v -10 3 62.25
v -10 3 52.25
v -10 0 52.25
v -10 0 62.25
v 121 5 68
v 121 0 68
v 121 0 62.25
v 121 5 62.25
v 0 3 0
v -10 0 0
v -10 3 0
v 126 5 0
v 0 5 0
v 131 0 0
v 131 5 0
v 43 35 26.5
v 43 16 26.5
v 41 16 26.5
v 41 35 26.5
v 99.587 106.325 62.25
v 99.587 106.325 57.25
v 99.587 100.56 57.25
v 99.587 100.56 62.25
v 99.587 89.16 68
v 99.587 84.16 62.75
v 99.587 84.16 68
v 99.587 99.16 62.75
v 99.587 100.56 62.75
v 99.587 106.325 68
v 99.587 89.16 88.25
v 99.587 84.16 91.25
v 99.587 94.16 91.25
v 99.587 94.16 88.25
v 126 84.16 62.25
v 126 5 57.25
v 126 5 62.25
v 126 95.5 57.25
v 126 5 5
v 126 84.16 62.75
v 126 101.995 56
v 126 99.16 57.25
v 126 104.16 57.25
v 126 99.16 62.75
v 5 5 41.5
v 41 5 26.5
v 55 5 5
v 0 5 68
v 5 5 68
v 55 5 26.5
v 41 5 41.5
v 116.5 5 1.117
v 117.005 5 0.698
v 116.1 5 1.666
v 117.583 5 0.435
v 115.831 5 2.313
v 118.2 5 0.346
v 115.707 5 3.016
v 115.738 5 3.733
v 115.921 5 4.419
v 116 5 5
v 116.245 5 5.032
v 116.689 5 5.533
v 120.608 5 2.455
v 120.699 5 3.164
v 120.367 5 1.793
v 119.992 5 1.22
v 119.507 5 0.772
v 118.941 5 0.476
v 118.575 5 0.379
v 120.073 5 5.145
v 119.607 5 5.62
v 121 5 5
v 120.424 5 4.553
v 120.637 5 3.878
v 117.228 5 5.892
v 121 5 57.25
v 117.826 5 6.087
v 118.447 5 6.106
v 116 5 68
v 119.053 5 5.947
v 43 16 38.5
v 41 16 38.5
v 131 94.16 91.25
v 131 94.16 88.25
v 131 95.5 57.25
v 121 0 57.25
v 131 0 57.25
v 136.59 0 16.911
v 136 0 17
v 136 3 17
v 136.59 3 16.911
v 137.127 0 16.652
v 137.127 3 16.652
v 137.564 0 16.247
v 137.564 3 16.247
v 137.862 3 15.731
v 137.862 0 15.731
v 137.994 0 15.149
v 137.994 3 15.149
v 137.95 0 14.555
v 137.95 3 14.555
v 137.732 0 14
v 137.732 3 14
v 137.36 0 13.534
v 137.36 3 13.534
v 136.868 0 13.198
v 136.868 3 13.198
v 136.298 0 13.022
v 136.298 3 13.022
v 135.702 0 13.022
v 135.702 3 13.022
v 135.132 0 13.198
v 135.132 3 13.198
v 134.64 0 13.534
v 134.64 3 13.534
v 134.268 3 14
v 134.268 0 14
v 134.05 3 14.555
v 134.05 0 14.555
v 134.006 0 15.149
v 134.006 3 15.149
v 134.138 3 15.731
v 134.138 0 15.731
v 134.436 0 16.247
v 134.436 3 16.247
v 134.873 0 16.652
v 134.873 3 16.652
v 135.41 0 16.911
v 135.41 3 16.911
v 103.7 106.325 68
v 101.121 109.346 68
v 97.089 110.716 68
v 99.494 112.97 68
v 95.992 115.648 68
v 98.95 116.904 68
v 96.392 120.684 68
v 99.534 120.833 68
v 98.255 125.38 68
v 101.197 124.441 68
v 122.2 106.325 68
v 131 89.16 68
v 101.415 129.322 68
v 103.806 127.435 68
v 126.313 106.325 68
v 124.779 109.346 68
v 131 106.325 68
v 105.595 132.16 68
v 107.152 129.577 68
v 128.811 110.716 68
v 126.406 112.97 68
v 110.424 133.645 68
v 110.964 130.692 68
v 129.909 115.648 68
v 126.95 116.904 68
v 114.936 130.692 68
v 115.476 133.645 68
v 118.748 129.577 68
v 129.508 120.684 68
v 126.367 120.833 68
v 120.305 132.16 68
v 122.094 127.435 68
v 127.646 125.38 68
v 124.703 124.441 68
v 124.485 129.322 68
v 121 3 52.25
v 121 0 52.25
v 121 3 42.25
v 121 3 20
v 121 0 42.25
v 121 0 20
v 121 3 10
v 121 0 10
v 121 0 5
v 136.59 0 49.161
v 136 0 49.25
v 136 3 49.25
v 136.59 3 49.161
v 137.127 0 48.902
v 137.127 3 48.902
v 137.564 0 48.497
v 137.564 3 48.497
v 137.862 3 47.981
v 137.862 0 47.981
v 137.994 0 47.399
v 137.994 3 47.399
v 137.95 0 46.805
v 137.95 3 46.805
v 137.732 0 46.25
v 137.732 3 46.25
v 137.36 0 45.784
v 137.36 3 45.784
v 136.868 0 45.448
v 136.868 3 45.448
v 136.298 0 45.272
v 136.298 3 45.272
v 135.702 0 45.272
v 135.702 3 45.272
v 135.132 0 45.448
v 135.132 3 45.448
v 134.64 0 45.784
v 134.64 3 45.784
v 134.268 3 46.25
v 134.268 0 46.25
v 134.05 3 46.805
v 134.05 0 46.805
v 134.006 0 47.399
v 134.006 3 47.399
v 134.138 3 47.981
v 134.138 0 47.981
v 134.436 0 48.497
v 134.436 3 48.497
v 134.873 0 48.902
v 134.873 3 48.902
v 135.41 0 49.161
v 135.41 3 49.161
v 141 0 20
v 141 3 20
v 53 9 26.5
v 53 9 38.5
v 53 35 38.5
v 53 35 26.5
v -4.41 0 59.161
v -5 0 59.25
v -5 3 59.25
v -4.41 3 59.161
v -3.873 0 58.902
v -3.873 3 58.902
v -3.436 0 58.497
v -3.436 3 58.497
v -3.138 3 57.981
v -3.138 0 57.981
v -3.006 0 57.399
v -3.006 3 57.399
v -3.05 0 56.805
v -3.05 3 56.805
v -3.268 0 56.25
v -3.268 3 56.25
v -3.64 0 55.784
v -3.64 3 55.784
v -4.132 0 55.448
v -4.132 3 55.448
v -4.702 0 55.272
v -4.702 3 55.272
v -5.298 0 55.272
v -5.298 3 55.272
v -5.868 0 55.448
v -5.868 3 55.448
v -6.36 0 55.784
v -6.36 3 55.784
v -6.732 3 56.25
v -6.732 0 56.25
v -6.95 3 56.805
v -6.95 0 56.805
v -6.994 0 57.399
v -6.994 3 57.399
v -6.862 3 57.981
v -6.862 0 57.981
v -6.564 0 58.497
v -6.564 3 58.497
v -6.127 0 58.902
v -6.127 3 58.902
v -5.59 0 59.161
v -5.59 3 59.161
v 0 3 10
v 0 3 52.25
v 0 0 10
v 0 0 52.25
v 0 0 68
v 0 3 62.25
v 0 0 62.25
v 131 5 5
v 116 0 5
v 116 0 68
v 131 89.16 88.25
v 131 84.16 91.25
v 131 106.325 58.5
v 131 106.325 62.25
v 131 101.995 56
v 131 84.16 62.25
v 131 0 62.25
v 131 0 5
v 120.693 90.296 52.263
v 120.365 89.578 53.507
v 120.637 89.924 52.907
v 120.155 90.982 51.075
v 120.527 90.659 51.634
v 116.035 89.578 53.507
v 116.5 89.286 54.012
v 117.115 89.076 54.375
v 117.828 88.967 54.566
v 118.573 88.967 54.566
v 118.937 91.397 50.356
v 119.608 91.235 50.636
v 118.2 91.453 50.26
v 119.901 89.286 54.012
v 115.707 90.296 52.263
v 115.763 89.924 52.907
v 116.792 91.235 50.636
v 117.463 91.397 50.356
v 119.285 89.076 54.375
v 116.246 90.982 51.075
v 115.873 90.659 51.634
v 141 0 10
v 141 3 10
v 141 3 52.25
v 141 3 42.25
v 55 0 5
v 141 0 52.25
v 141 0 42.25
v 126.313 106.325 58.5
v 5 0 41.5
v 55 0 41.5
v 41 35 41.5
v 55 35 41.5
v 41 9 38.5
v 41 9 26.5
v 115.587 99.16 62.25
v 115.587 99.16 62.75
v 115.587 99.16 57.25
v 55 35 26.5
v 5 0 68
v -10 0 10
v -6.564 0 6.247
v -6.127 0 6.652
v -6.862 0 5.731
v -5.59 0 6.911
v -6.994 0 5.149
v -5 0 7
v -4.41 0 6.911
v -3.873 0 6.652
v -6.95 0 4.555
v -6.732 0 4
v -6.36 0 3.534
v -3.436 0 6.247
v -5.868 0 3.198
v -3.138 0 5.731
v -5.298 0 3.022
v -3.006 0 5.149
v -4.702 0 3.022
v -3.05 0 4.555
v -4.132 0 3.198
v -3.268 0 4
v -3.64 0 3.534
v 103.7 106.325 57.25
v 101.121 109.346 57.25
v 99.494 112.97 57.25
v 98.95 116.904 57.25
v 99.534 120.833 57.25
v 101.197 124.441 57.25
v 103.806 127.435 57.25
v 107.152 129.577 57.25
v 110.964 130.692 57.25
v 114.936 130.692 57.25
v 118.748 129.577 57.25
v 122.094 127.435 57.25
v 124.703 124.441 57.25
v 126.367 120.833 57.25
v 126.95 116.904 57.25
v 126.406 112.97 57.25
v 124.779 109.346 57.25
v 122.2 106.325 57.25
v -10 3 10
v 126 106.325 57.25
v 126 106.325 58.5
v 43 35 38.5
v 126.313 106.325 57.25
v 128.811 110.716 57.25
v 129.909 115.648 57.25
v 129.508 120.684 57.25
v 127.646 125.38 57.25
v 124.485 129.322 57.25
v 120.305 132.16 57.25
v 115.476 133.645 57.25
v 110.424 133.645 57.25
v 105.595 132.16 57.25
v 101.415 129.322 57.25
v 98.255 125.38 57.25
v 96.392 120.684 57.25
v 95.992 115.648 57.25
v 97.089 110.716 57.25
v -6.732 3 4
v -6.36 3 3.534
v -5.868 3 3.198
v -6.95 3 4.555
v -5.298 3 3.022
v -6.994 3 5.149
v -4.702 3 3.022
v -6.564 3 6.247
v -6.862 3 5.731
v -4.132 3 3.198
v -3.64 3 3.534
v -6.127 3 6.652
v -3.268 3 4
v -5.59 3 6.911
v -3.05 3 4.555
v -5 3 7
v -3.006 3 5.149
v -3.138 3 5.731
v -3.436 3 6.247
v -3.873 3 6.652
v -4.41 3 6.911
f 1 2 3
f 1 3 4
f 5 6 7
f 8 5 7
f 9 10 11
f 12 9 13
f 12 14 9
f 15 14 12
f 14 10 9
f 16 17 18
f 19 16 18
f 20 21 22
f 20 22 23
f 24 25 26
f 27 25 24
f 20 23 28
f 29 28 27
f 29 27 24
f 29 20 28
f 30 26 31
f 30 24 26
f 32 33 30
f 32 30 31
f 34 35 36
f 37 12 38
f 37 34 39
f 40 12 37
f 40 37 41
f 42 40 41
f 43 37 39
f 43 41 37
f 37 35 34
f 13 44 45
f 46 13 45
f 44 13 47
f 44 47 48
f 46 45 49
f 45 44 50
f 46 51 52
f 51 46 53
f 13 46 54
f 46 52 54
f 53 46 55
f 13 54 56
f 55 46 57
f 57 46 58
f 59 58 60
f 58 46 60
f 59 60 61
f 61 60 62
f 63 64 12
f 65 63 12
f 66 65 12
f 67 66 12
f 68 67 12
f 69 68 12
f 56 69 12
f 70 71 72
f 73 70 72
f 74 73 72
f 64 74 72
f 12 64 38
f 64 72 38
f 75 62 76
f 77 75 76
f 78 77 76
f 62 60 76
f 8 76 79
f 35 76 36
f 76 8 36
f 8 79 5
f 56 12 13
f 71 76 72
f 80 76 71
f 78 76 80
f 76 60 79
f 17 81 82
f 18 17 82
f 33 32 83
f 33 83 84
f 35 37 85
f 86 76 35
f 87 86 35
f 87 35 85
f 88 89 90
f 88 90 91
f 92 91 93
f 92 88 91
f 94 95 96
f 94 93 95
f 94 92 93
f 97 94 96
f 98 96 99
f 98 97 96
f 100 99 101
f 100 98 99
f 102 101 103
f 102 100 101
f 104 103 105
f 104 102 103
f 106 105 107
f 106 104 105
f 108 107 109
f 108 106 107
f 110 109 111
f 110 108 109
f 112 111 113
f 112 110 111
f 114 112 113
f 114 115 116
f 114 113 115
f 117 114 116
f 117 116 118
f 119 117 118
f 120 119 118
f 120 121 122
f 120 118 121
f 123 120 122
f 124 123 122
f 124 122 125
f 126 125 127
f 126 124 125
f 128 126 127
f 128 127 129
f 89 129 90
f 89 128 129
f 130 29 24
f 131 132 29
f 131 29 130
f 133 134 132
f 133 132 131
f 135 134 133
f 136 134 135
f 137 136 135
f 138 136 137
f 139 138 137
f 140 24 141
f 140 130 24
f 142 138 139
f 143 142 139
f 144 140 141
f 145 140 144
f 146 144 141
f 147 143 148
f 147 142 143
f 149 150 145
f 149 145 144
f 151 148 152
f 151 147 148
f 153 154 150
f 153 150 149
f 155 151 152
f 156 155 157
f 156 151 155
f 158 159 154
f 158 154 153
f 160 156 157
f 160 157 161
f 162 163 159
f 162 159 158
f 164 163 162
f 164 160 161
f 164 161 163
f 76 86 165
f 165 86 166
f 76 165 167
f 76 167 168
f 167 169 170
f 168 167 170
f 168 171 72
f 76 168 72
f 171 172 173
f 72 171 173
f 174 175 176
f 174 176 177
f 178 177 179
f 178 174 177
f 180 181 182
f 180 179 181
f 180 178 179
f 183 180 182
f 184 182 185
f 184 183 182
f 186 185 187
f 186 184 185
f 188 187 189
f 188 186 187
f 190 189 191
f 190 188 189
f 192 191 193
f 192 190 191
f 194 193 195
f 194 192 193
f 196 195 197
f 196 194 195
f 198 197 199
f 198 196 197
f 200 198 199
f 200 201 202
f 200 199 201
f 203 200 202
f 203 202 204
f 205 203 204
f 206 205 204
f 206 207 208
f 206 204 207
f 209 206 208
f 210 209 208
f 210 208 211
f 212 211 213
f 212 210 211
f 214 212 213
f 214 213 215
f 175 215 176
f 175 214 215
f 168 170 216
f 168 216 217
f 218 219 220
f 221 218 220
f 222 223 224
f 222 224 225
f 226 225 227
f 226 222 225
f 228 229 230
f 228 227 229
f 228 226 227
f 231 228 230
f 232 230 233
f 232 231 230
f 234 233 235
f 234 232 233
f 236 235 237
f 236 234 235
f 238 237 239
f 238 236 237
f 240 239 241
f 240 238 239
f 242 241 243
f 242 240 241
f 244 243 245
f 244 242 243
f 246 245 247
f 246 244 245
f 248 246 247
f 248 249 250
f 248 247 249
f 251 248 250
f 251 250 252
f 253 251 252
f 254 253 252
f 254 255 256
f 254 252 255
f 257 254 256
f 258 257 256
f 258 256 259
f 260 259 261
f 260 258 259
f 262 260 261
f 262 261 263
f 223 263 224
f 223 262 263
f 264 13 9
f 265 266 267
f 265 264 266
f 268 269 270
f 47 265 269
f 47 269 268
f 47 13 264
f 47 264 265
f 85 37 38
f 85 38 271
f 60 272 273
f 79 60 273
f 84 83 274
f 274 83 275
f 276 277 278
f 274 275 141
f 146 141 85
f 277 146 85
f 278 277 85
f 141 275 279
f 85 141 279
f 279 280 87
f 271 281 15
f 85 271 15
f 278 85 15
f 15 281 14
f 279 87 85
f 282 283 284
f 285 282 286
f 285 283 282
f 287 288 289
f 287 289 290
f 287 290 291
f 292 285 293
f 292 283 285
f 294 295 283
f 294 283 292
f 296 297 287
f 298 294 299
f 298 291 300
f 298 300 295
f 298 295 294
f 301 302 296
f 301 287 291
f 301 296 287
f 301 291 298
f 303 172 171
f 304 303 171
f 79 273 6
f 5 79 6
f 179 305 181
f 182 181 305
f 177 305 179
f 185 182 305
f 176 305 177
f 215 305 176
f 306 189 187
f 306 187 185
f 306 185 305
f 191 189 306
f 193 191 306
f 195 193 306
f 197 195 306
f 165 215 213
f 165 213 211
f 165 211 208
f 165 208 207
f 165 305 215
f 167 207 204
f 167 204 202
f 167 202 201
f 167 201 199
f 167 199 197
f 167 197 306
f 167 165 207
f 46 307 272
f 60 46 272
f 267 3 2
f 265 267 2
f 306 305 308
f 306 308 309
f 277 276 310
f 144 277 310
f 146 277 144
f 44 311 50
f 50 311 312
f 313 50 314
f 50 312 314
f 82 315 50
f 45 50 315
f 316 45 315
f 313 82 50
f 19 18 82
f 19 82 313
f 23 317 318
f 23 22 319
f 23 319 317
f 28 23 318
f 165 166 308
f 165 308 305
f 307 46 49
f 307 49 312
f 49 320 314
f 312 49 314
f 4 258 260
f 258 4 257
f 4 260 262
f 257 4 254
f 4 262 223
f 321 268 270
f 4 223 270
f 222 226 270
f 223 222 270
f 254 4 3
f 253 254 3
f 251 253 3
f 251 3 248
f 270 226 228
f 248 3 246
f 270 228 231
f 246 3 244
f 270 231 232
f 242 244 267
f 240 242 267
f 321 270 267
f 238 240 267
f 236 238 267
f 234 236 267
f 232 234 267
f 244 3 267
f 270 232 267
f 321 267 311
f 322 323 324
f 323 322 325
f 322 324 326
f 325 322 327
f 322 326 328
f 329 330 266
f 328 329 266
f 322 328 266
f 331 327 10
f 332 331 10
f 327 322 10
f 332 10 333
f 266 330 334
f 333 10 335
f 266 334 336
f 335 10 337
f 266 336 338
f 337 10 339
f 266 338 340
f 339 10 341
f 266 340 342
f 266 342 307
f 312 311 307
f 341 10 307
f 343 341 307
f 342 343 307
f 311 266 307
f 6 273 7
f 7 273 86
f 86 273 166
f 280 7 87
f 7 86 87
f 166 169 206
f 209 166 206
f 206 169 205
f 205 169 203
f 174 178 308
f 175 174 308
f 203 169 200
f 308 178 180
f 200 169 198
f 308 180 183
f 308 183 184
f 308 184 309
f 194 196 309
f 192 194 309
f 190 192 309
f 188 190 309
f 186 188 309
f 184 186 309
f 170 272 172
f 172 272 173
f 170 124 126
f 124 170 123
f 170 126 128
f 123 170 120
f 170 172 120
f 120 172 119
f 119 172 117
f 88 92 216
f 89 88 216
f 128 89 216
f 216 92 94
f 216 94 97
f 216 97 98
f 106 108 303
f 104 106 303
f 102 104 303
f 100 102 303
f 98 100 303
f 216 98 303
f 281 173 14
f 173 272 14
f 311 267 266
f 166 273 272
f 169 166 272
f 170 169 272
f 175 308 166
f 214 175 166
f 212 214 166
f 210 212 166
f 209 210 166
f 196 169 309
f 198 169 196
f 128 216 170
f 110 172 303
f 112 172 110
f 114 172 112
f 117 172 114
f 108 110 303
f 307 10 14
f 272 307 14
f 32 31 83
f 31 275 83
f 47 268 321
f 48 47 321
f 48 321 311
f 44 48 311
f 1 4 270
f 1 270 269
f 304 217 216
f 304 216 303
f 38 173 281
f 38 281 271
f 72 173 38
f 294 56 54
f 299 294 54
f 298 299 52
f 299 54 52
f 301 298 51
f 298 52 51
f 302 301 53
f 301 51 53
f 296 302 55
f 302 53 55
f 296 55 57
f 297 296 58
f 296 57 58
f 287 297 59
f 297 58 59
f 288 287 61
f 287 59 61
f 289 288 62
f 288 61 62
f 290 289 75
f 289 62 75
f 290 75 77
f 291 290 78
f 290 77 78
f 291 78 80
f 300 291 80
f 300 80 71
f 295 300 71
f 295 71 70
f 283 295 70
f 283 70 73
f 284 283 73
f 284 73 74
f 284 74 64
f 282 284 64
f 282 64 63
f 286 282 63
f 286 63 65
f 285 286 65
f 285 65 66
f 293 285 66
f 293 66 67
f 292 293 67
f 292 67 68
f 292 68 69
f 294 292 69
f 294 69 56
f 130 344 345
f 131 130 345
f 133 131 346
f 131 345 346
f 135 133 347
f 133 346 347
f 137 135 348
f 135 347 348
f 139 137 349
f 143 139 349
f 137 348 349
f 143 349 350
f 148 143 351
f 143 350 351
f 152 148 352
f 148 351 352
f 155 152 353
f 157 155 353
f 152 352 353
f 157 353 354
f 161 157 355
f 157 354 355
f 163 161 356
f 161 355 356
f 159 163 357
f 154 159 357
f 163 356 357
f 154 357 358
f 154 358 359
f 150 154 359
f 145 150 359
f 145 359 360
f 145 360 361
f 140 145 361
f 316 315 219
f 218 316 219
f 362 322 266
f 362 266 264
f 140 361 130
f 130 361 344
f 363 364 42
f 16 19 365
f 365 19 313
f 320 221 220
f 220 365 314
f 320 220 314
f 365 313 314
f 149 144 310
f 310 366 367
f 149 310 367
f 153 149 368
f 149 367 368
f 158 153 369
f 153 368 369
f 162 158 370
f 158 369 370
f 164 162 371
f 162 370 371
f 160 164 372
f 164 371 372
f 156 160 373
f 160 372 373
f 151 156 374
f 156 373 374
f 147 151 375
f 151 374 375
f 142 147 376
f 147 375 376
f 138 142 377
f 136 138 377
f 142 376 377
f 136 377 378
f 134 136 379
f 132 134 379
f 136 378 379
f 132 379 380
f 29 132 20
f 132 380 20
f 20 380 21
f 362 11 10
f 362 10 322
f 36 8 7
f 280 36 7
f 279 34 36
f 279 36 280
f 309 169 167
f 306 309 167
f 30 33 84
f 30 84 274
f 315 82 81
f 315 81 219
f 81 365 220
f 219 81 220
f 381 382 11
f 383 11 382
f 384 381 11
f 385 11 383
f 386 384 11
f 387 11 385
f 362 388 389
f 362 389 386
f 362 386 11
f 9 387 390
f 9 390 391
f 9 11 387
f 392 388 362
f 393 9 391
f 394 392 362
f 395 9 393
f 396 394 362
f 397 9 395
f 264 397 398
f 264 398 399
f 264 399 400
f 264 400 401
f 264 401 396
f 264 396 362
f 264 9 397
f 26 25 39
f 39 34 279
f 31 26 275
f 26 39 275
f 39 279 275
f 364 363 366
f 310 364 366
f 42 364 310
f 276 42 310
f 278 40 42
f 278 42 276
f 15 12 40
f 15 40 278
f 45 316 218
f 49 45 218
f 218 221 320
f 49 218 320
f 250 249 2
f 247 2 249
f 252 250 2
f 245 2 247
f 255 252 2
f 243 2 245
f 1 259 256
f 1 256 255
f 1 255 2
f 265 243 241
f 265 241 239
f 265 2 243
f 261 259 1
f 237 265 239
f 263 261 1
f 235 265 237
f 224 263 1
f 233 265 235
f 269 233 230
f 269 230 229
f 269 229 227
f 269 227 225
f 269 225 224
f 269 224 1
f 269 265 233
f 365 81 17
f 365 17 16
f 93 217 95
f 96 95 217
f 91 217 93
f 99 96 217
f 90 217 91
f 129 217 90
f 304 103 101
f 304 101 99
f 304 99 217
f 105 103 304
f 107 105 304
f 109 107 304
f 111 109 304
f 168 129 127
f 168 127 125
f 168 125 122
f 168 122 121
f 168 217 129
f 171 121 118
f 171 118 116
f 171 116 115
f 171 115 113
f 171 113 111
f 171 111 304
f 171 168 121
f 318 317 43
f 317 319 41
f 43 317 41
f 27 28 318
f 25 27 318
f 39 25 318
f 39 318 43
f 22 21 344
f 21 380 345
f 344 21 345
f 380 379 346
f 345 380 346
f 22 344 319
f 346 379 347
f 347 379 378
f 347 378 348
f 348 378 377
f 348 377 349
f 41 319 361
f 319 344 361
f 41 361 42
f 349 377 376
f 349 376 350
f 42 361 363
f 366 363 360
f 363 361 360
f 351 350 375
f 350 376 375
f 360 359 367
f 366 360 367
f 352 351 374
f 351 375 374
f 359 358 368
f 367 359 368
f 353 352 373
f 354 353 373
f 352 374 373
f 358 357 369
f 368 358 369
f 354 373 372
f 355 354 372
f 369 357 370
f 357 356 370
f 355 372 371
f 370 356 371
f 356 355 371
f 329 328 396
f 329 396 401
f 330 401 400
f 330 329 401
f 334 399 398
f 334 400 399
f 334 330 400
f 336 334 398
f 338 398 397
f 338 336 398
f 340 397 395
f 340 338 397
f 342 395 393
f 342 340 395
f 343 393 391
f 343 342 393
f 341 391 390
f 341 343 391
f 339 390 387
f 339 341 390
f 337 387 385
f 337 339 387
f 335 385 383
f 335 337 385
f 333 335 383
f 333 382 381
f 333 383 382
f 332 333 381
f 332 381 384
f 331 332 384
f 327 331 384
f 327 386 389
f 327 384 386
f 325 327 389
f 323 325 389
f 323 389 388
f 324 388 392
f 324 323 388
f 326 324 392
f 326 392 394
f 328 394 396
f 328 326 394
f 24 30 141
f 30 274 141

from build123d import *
from OCP.BRepAlgoAPI import BRepAlgoAPI_Cut
from OCP.TopTools import TopTools_ListOfShape

# Parameters (mm, degrees)
BOSS_EXTRUDE1_DEPTH              = 5
SKETCH2_R                        = 2.5
BOSS_EXTRUDE2_DEPTH              = 100
SKETCH3_W                        = 5
SKETCH3_H                        = 5
BOSS_EXTRUDE3_DEPTH              = 10
SKETCH5_W                        = 5
SKETCH5_H                        = 4.330127019
BOSS_EXTRUDE4_DEPTH              = 117
SKETCH6_W                        = 5
SKETCH6_H                        = 5
BOSS_EXTRUDE5_DEPTH              = 20
BOSS_EXTRUDE6_DEPTH              = 15
SKETCH9_W                        = 5
SKETCH9_H                        = 5
BOSS_EXTRUDE7_DEPTH              = 10
SKETCH10_W                       = 5
SKETCH10_H                       = 5
BOSS_EXTRUDE8_DEPTH              = 99.159909
SKETCH11_W                       = 10
SKETCH11_H                       = 3
BOSS_EXTRUDE9_DEPTH              = 10
CUT_EXTRUDE1_DEPTH               = 187.084790711
CUT_EXTRUDE1_DEPTH_BACK          = 187.084790711
SKETCH13_R                       = 2
SKETCH14_W                       = 10
SKETCH14_H                       = 3
BOSS_EXTRUDE10_DEPTH             = 20
CUT_EXTRUDE2_DEPTH               = 194.255140511
CUT_EXTRUDE2_DEPTH_BACK          = 194.255140511
SKETCH15_R                       = 2
BOSS_EXTRUDE11_DEPTH             = 7.8
CUT_EXTRUDE3_DEPTH               = 187.016127587
CUT_EXTRUDE3_DEPTH_BACK          = 187.016127587
SKETCH17_W                       = 22.17902444
SKETCH17_H                       = 20
BOSS_EXTRUDE12_DEPTH             = 5.75
BOSS_EXTRUDE12_DEPTH_BACK        = 5
SKETCH19_W                       = 1.5
SKETCH19_H                       = 10.75
BOSS_EXTRUDE13_DEPTH             = 2.742414
SKETCH21_W                       = 1.5
SKETCH21_H                       = 1
BOSS_EXTRUDE15_DEPTH             = 1
BOSS_EXTRUDE17_REACH             = 195.512
CUT_EXTRUDE4_START               = 2
SKETCH23_W                       = 7.8
SKETCH23_H                       = 12
CUT_EXTRUDE4_DEPTH               = 10
BOSS_EXTRUDE19_DEPTH             = 5
BOSS_EXTRUDE19_DEPTH_BACK        = 2.165064
SKETCH23_2_W                     = 7.8
SKETCH23_2_H                     = 12
CUT_EXTRUDE5_DEPTH               = 1.25
BOSS_EXTRUDE20_REACH             = 188.016
SKETCH25_W                       = 5
SKETCH25_H                       = 4.330127019
SKETCH26_W                       = 5
SKETCH26_H                       = 2.16506351
CUT_EXTRUDE6_DEPTH               = 5
SKETCH27_W                       = 5.75
SKETCH27_H                       = 7.16506351
BOSS_EXTRUDE21_DEPTH             = 5
SKETCH29_W                       = 3
SKETCH29_H                       = 30
BOSS_EXTRUDE22_DEPTH             = 55
SKETCH30_W                       = 5
SKETCH30_H                       = 3
BOSS_EXTRUDE23_DEPTH             = 5
SKETCH31_W                       = 5
SKETCH31_H                       = 5
BOSS_EXTRUDE24_DEPTH             = 33.5
SKETCH32_W                       = 2
SKETCH32_H                       = 19
BOSS_EXTRUDE25_DEPTH             = 12
SKETCH34_W                       = 41
SKETCH34_H                       = 3
CUT_EXTRUDE7_DEPTH               = 30
SKETCH35_W                       = 14
SKETCH35_H                       = 12
BOSS_EXTRUDE26_DEPTH             = 7
BOSS_EXTRUDE27_REACH             = 187.154
SKETCH36_W                       = 9
SKETCH36_H                       = 5
BOSS_EXTRUDE27_DIRECTION_2_REACH = 187.154
SKETCH37_W                       = 41.5
SKETCH37_H                       = 5
BOSS_EXTRUDE28_DEPTH             = 41
SKETCH38_W                       = 34.251665069
SKETCH38_H                       = 27.087918127
CUT_EXTRUDE8_DEPTH               = 185.330721404
SKETCH39_W                       = 67.684653824
SKETCH39_H                       = 30.030202731
CUT_EXTRUDE9_DEPTH               = 190.235302527
SKETCH44_W                       = 5
SKETCH44_H                       = 7.16506351
BOSS_EXTRUDE30_DEPTH             = 18.612596
BOSS_EXTRUDE31_DEPTH             = 10.75
BOSS_EXTRUDE32_DEPTH             = 5.75
SKETCH46_W                       = 5
SKETCH46_H                       = 5
EDIT_THIS_LENGTH_DEPTH           = 29
SKETCH47_W                       = 5
SKETCH47_H                       = 3
BOSS_EXTRUDE34_DEPTH             = 5
BOSS_EXTRUDE35_REACH             = 197.039
SKETCH48_W                       = 26.412596329
SKETCH48_H                       = 5.25
SKETCH50_W                       = 5
SKETCH50_H                       = 5.75
BOSS_EXTRUDE36_DEPTH             = 10
BOSS_EXTRUDE37_DEPTH             = 26.412596329
CHAMFER1_SIZE                    = 16
CHAMFER1_SIZE2                   = 1.399818616


with BuildPart() as part:
    # Sketch1 → Boss-Extrude1 (new body)
    with BuildSketch(Plane(origin=(0, 0, 0), x_dir=(1, 0, 0), z_dir=(0, 1, 0))):
        Polygon((121, 0), (0, 0), (0, -68), (5, -68), (5, -5), (116, -5), (116, -68), (121, -68), align=None)
    extrude(amount=BOSS_EXTRUDE1_DEPTH)

    # Sketch2 → Boss-Extrude2 (add)
    with BuildSketch(Plane(origin=(0, 3.75, 2.165063509), x_dir=(1, 0, 0), z_dir=(0, 0.866025403784438, 0.500000000000001))):
        with Locations(Location((118.200131686, -0.299868314, 0), (0, 0, 90))):
            Circle(SKETCH2_R)
    extrude(amount=BOSS_EXTRUDE2_DEPTH)

    # Sketch3 → Boss-Extrude3 (add)
    with BuildSketch(Plane(origin=(121, 0, 0), x_dir=(0, 0, -1), z_dir=(1, 0, 0))):
        with Locations((-2.5, 2.5)):
            Rectangle(SKETCH3_W, SKETCH3_H)
    extrude(amount=BOSS_EXTRUDE3_DEPTH)

    # Sketch5 → Boss-Extrude4 (add)
    with BuildSketch(Plane(origin=(0, 3.75, 2.165063509), x_dir=(1, 0, 0), z_dir=(0, 0.866025403784438, 0.500000000000001))):
        with Locations((128.5, 0.33493649)):
            Rectangle(SKETCH5_W, SKETCH5_H)
    extrude(amount=BOSS_EXTRUDE4_DEPTH)

    # Sketch6 → Boss-Extrude5 (add)
    with BuildSketch(Plane(origin=(0, 1.25, -2.165063509), x_dir=(-1, 0, 0), z_dir=(0, 0.5000000000000009, -0.866025403784438))):
        with Locations((-128.5, 118.830127019)):
            Rectangle(SKETCH6_W, SKETCH6_H)
    extrude(amount=BOSS_EXTRUDE5_DEPTH)

    # Sketch7 → Boss-Extrude6 (add)
    with BuildSketch(Plane.ZY.offset(-126)):
        Polygon((45.509618943, 113.824972243), (41.179491924, 116.324972243), (38.679491924, 111.994845224), (43.009618943, 109.494845224), align=None)
    extrude(amount=BOSS_EXTRUDE6_DEPTH)

    # Sketch9 → Boss-Extrude7 (add)
    with BuildSketch(Plane(origin=(121, 0, 0), x_dir=(0, 0, -1), z_dir=(1, 0, 0))):
        with Locations((-59.75, 2.5)):
            Rectangle(SKETCH9_W, SKETCH9_H)
    extrude(amount=BOSS_EXTRUDE7_DEPTH)

    # Sketch10 → Boss-Extrude8 (add)
    with BuildSketch(Plane(origin=(0, 5, 0), x_dir=(1, 0, 0), z_dir=(0, 1, 0))):
        with Locations((128.5, -59.75)):
            Rectangle(SKETCH10_W, SKETCH10_H)
    extrude(amount=BOSS_EXTRUDE8_DEPTH)

    # Sketch11 → Boss-Extrude9 (add)
    with BuildSketch(Plane.ZY):
        with Locations((57.25, 1.5)):
            Rectangle(SKETCH11_W, SKETCH11_H)
        with Locations((5, 1.5)):
            Rectangle(SKETCH11_W, SKETCH11_H)
    extrude(amount=BOSS_EXTRUDE9_DEPTH)

    # Sketch13 → Cut-Extrude1 (cut, two sides: drawn at the far end of the back side and taken through both)
    with BuildSketch(Plane(origin=(0, 3, 0), x_dir=(1, 0, 0), z_dir=(0, 1, 0)).offset(-CUT_EXTRUDE1_DEPTH_BACK)):
        with Locations(Location((-5, -5, 0), (0, 0, 270))):
            Circle(SKETCH13_R)
        with Locations(Location((-5, -57.25, 0), (0, 0, 270))):
            Circle(SKETCH13_R)
    extrude(amount=CUT_EXTRUDE1_DEPTH + CUT_EXTRUDE1_DEPTH_BACK, mode=Mode.SUBTRACT)

    # Sketch14 → Boss-Extrude10 (add)
    with BuildSketch(Plane(origin=(121, 0, 0), x_dir=(0, 0, -1), z_dir=(1, 0, 0))):
        with Locations((-15, 1.5)):
            Rectangle(SKETCH14_W, SKETCH14_H)
        with Locations((-47.25, 1.5)):
            Rectangle(SKETCH14_W, SKETCH14_H)
    extrude(amount=BOSS_EXTRUDE10_DEPTH)

    # Sketch15 → Cut-Extrude2 (cut, two sides: drawn at the far end of the back side and taken through both)
    with BuildSketch(Plane(origin=(0, 3, 0), x_dir=(1, 0, 0), z_dir=(0, 1, 0)).offset(-CUT_EXTRUDE2_DEPTH_BACK)):
        with Locations(Location((136, -15, 0), (0, 0, 270))):
            Circle(SKETCH15_R)
        with Locations(Location((136, -47.25, 0), (0, 0, 270))):
            Circle(SKETCH15_R)
    extrude(amount=CUT_EXTRUDE2_DEPTH + CUT_EXTRUDE2_DEPTH_BACK, mode=Mode.SUBTRACT)

    # Sketch16 → Boss-Extrude11 (add)
    with BuildSketch(Plane.ZY.offset(-126)):
        Polygon((49.839745962, 111.324972243), (67, 101.417494955), (64.5, 97.087367936), (47.339745962, 106.994845224), align=None)
    extrude(amount=BOSS_EXTRUDE11_DEPTH)

    # Sketch17 → Cut-Extrude3 (cut, two sides: drawn at the far end of the back side and taken through both)
    with BuildSketch(Plane(origin=(0, 105.074972243, 60.665063509), x_dir=(1, 0, 0), z_dir=(0, 0.8660254037844382, 0.500000000000001)).offset(-CUT_EXTRUDE3_DEPTH_BACK)):
        with Locations((119.91048778, 12.5)):
            Rectangle(SKETCH17_W, SKETCH17_H)
    extrude(amount=CUT_EXTRUDE3_DEPTH + CUT_EXTRUDE3_DEPTH_BACK, mode=Mode.SUBTRACT)



with BuildPart() as body_2:
    # Sketch18 → Boss-Extrude12 (new, two sides: drawn at the far end of the back side and taken through both)
    with BuildSketch(Plane.XY.offset(62.25).offset(-BOSS_EXTRUDE12_DEPTH_BACK)):
        with BuildLine():
            Line((118.2, 104.159908733), (119.7, 104.159908733))
            ThreePointArc((119.7, 104.159908733), (110.2, 113.659908733), (100.7, 104.159908733))
            Line((100.7, 104.159908733), (102.2, 104.159908733))
            ThreePointArc((102.2, 104.159908733), (110.2, 112.159908733), (118.2, 104.159908733))
        make_face()
    extrude(amount=BOSS_EXTRUDE12_DEPTH + BOSS_EXTRUDE12_DEPTH_BACK)


with BuildPart() as part_1:
    add(part.part)

    add(body_2.part)  # Boss-Extrude13 merges body 2
    # Sketch19 → Boss-Extrude13 (add)
    with BuildSketch(Plane.XZ.offset(-104.159908733)):
        with Locations((118.95, 62.625)):
            Rectangle(SKETCH19_W, SKETCH19_H)
    extrude(amount=BOSS_EXTRUDE13_DEPTH)

    # Sketch21 → Boss-Extrude15 (add)
    with BuildSketch(Plane.XZ.offset(-101.417494955)):
        with Locations((118.95, 67.5)):
            Rectangle(SKETCH21_W, SKETCH21_H)
    extrude(amount=BOSS_EXTRUDE15_DEPTH)

    # Boss-Extrude17: up to this plane
    boss_extrude17_end = Plane(origin=(119.7, 101.417494955, 68), z_dir=(0, 0, -1))
    # Sketch20 → Boss-Extrude17 (add, up to the surface)
    with BuildSketch(Plane(origin=(0, -3.657477288, 6.334936491), x_dir=(1, 0, 0), z_dir=(0, -0.5000000000000039, 0.8660254037844365)), mode=Mode.PRIVATE) as boss_extrude17_sk1:
        Polygon((126, 116.330127019), (126, 121.330127019), (119.7, 121.330127019), (118.2, 121.330127019), (118.2, 116.330127019), align=None)
    boss_extrude17_tool1 = split(extrude(boss_extrude17_sk1.sketch, amount=BOSS_EXTRUDE17_REACH, mode=Mode.PRIVATE), bisect_by=boss_extrude17_end, keep=Keep.BOTH, mode=Mode.PRIVATE)
    add(boss_extrude17_tool1.solids().sort_by_distance((122.1, 99.252431, 65.75))[0])

    # Sketch23 → Cut-Extrude4 (cut)
    with BuildSketch(Plane(origin=(0, 104.159908733, 0), x_dir=(-1, 0, 0), z_dir=(0, -1, 0)).offset(CUT_EXTRUDE4_START)):
        with Locations((-122.1, -62)):
            Rectangle(SKETCH23_W, SKETCH23_H)
    extrude(amount=CUT_EXTRUDE4_DEPTH, mode=Mode.SUBTRACT)

    # Sketch23<2> → Boss-Extrude19 (add, two sides: drawn at the far end of the back side and taken through both)
    with BuildSketch(Plane(origin=(0, 104.159908733, 0), x_dir=(-1, 0, 0), z_dir=(0, -1, 0)).offset(-BOSS_EXTRUDE19_DEPTH_BACK)):
        with Locations((-122.1, -62)):
            Rectangle(SKETCH23_2_W, SKETCH23_2_H)
    extrude(amount=BOSS_EXTRUDE19_DEPTH + BOSS_EXTRUDE19_DEPTH_BACK)


with BuildPart() as cut_extrude5_tool:
    # Sketch24 → Cut-Extrude5 (new body)
    with BuildSketch(Plane(origin=(0, 0, 56), x_dir=(-1, 0, 0), z_dir=(0, 0, -1))):
        Polygon((-126, 106.324972243), (-126, 101.994845224), (-126, 99.159908733), (-118.2, 99.159908733), (-118.2, 106.324972243), align=None)
    extrude(amount=-CUT_EXTRUDE5_DEPTH)


with BuildPart() as part_2:
    add(part_1.part)

    # Cut-Extrude5: cut by cut_extrude5_tool, with a tolerance
    cut_extrude5_stock = TopTools_ListOfShape()
    cut_extrude5_stock.Append(part_2.part.wrapped)
    cut_extrude5_tools = TopTools_ListOfShape()
    cut_extrude5_tools.Append(cut_extrude5_tool.part.wrapped)
    cut_extrude5_cut = BRepAlgoAPI_Cut()
    cut_extrude5_cut.SetArguments(cut_extrude5_stock)
    cut_extrude5_cut.SetTools(cut_extrude5_tools)
    cut_extrude5_cut.SetFuzzyValue(0.00001)
    cut_extrude5_cut.Build()
    add(Compound.cast(cut_extrude5_cut.Shape()).solids(), mode=Mode.REPLACE)

    # Boss-Extrude20: up to this face of the body (flat: up to its plane)
    boss_extrude20_end = Plane(part_2.part.faces().sort_by_distance((122.724999943, 106.324972733, 62.625))[0])
    # Sketch25 → Boss-Extrude20 (add, up to the picked face)
    with BuildSketch(Plane(origin=(0, 105.074972243, 60.665063509), x_dir=(1, 0, 0), z_dir=(0, 0.8660254037844382, 0.500000000000001)), mode=Mode.PRIVATE) as boss_extrude20_sk1:
        with Locations((128.5, 0.33493649)):
            Rectangle(SKETCH25_W, SKETCH25_H)
    boss_extrude20_tool1 = split(extrude(boss_extrude20_sk1.sketch, amount=BOSS_EXTRUDE20_REACH, mode=Mode.PRIVATE), bisect_by=boss_extrude20_end, keep=Keep.BOTH, mode=Mode.PRIVATE)
    add(boss_extrude20_tool1.solids().sort_by(Axis((128.5, 105.24244, 60.375), (0, 0.8660254037844382, 0.500000000000001)))[0])


with BuildPart() as cut_extrude6_tool:
    # Sketch26 → Cut-Extrude6 (new body)
    with BuildSketch(Plane.XY.offset(62.25)):
        with Locations((128.5, 105.242440488)):
            Rectangle(SKETCH26_W, SKETCH26_H)
    extrude(amount=CUT_EXTRUDE6_DEPTH)


with BuildPart() as part_3:
    add(part_2.part)

    # Cut-Extrude6: cut by cut_extrude6_tool, with a tolerance
    cut_extrude6_stock = TopTools_ListOfShape()
    cut_extrude6_stock.Append(part_3.part.wrapped)
    cut_extrude6_tools = TopTools_ListOfShape()
    cut_extrude6_tools.Append(cut_extrude6_tool.part.wrapped)
    cut_extrude6_cut = BRepAlgoAPI_Cut()
    cut_extrude6_cut.SetArguments(cut_extrude6_stock)
    cut_extrude6_cut.SetTools(cut_extrude6_tools)
    cut_extrude6_cut.SetFuzzyValue(0.00001)
    cut_extrude6_cut.Build()
    add(Compound.cast(cut_extrude6_cut.Shape()).solids(), mode=Mode.REPLACE)

    # Sketch27 → Boss-Extrude21 (add)
    with BuildSketch(Plane(origin=(126, 0, 0), x_dir=(0, 0, -1), z_dir=(1, 0, 0))):
        with Locations((-65.125, 102.742440488)):
            Rectangle(SKETCH27_W, SKETCH27_H)
    extrude(amount=BOSS_EXTRUDE21_DEPTH)

    # Sketch29 → Boss-Extrude22 (add)
    with BuildSketch(Plane.ZY):
        with Locations((40, 20)):
            Rectangle(SKETCH29_W, SKETCH29_H)
    extrude(amount=-BOSS_EXTRUDE22_DEPTH)

    # Sketch30 → Boss-Extrude23 (add)
    with BuildSketch(Plane.XZ.offset(-5)):
        with Locations((52.5, 40)):
            Rectangle(SKETCH30_W, SKETCH30_H)
    extrude(amount=BOSS_EXTRUDE23_DEPTH)

    # Sketch31 → Boss-Extrude24 (add)
    with BuildSketch(Plane(origin=(0, 0, 38.5), x_dir=(-1, 0, 0), z_dir=(0, 0, -1))):
        with Locations((-52.5, 2.5)):
            Rectangle(SKETCH31_W, SKETCH31_H)
    extrude(amount=BOSS_EXTRUDE24_DEPTH)

    # Sketch32 → Boss-Extrude25 (add)
    with BuildSketch(Plane(origin=(0, 0, 38.5), x_dir=(-1, 0, 0), z_dir=(0, 0, -1))):
        Polygon((-41, 9), (-53, 9), (-53, 35), (-55, 35), (-55, 7), (-41, 7), align=None)
        with Locations((-42, 25.5)):
            Rectangle(SKETCH32_W, SKETCH32_H)
    extrude(amount=BOSS_EXTRUDE25_DEPTH)

    # Sketch34 → Cut-Extrude7 (cut)
    with BuildSketch(Plane(origin=(0, 35, 0), x_dir=(1, 0, 0), z_dir=(0, 1, 0))):
        with Locations((20.5, -40)):
            Rectangle(SKETCH34_W, SKETCH34_H)
    extrude(amount=-CUT_EXTRUDE7_DEPTH, mode=Mode.SUBTRACT)

    # Sketch35 → Boss-Extrude26 (add)
    with BuildSketch(Plane.XZ.offset(-7)):
        with Locations((48, 32.5)):
            Rectangle(SKETCH35_W, SKETCH35_H)
    extrude(amount=BOSS_EXTRUDE26_DEPTH)

    # Boss-Extrude27: up to this face of the body (flat: up to its plane)
    boss_extrude27_end = Plane(part_3.part.faces().sort_by_distance((48.252808989, 19.016853933, 41.5))[0])
    # Sketch36 → Boss-Extrude27 (add, up to the picked face)
    with BuildSketch(Plane.XY.offset(38.5), mode=Mode.PRIVATE) as boss_extrude27_sk1:
        with Locations((45.5, 2.5)):
            Rectangle(SKETCH36_W, SKETCH36_H)
    boss_extrude27_tool1 = split(extrude(boss_extrude27_sk1.sketch, amount=BOSS_EXTRUDE27_REACH, mode=Mode.PRIVATE), bisect_by=boss_extrude27_end, keep=Keep.BOTH, mode=Mode.PRIVATE)
    add(boss_extrude27_tool1.solids().sort_by(Axis((45.5, 2.5, 38.5), (0, 0, 1)))[0])

    # Boss-Extrude27 direction 2: up to this face of the body (flat: up to its plane)
    boss_extrude27_direction_2_end = Plane(part_3.part.faces().sort_by_distance((27.5, 2.5, 5))[0])
    # Sketch36 → Boss-Extrude27 direction 2 (add, up to the picked face)
    with BuildSketch(Plane.XY.offset(38.5), mode=Mode.PRIVATE) as boss_extrude27_direction_2_sk1:
        with Locations((45.5, 2.5)):
            Rectangle(SKETCH36_W, SKETCH36_H)
    boss_extrude27_direction_2_tool1 = split(extrude(boss_extrude27_direction_2_sk1.sketch, amount=-BOSS_EXTRUDE27_DIRECTION_2_REACH, mode=Mode.PRIVATE), bisect_by=boss_extrude27_direction_2_end, keep=Keep.BOTH, mode=Mode.PRIVATE)
    add(boss_extrude27_direction_2_tool1.solids().sort_by(Axis((45.5, 2.5, 38.5), (0, 0, -1)))[0])

    # Sketch37 → Boss-Extrude28 (add)
    with BuildSketch(Plane.ZY.offset(-41)):
        with Locations((20.75, 2.5)):
            Rectangle(SKETCH37_W, SKETCH37_H)
    extrude(amount=BOSS_EXTRUDE28_DEPTH)

    # Sketch38 → Cut-Extrude8 (cut, through all)
    with BuildSketch(Plane.ZY.offset(-118.2)):
        with Locations((61.183105348, 109.662346151)):
            Rectangle(SKETCH38_W, SKETCH38_H)
    extrude(amount=CUT_EXTRUDE8_DEPTH, mode=Mode.SUBTRACT)

    # Sketch39 → Cut-Extrude9 (cut, through all)
    with BuildSketch(Plane(origin=(0, 106.324972243, 0), x_dir=(1, 0, 0), z_dir=(0, 1, 0))):
        with Locations((120.498501698, -57.225220953)):
            Rectangle(SKETCH39_W, SKETCH39_H)
    extrude(amount=CUT_EXTRUDE9_DEPTH, mode=Mode.SUBTRACT)

    # Sketch44 → Boss-Extrude30 (add)
    with BuildSketch(Plane.ZY.offset(-118.2)):
        with Locations((59.75, 102.742440488)):
            Rectangle(SKETCH44_W, SKETCH44_H)
    extrude(amount=BOSS_EXTRUDE30_DEPTH)

    # Sketch43 → Boss-Extrude31 (add)
    with BuildSketch(Plane(origin=(0, 0, 57.25), x_dir=(-1, 0, 0), z_dir=(0, 0, -1))):
        with BuildLine():
            Line((-122.200131686, 106.324972243), (-126, 106.324972243))
            Line((-126, 106.324972243), (-126.312859701, 106.324972243))
            ThreePointArc((-126.312859701, 106.324972243), (-112.950131686, 133.833897021), (-99.587403671, 106.324972243))
            Line((-99.587403671, 106.324972243), (-103.700131686, 106.324972243))
            ThreePointArc((-103.700131686, 106.324972243), (-112.950131686, 130.833897021), (-122.200131686, 106.324972243))
        make_face()
    extrude(amount=-BOSS_EXTRUDE31_DEPTH)

    # Sketch45 → Boss-Extrude32 (add)
    with BuildSketch(Plane.XY.offset(62.25)):
        Polygon((118.2, 99.159908733), (118.2, 106.324972243), (103.700131686, 106.324972243), (99.587403671, 106.324972243), (99.587403671, 99.159908733), align=None)
    extrude(amount=BOSS_EXTRUDE32_DEPTH)

    # Sketch46 → EDIT THIS LENGTH (add)
    with BuildSketch(Plane.XY.offset(62.25)):
        with Locations((128.5, 86.659908733)):
            Rectangle(SKETCH46_W, SKETCH46_H)
    extrude(amount=EDIT_THIS_LENGTH_DEPTH)

    # Sketch47 → Boss-Extrude34 (add)
    with BuildSketch(Plane(origin=(0, 89.159908733, 0), x_dir=(1, 0, 0), z_dir=(0, 1, 0))):
        with Locations((128.5, -89.75)):
            Rectangle(SKETCH47_W, SKETCH47_H)
    extrude(amount=BOSS_EXTRUDE34_DEPTH)

    # Boss-Extrude35: up to this face of the body (flat: up to its plane)
    boss_extrude35_end = Plane(part_3.part.faces().sort_by_distance((128.5, 84.159908733, 76.75))[0])
    # Sketch48 → Boss-Extrude35 (add, up to the picked face)
    with BuildSketch(Plane.XZ.offset(-99.159908733), mode=Mode.PRIVATE) as boss_extrude35_sk1:
        with Locations((112.793701836, 65.375)):
            Rectangle(SKETCH48_W, SKETCH48_H)
    boss_extrude35_tool1 = split(extrude(boss_extrude35_sk1.sketch, amount=BOSS_EXTRUDE35_REACH, mode=Mode.PRIVATE), bisect_by=boss_extrude35_end, keep=Keep.BOTH, mode=Mode.PRIVATE)
    add(boss_extrude35_tool1.solids().sort_by(Axis((112.793702, 99.159909, 65.375), (0, -1, 0)))[0])

    # Sketch50 → Boss-Extrude36 (add)
    with BuildSketch(Plane.XZ.offset(-99.159908733)):
        with Locations((128.5, 65.125)):
            Rectangle(SKETCH50_W, SKETCH50_H)
    extrude(amount=BOSS_EXTRUDE36_DEPTH)

    # Sketch51 → Boss-Extrude37 (add)
    with BuildSketch(Plane.ZY.offset(-126)):
        Polygon((68, 89.159908733), (68, 84.159908733), (91.25, 84.159908733), (91.25, 94.159908733), (88.25, 94.159908733), (88.25, 89.159908733), align=None)
    extrude(amount=BOSS_EXTRUDE37_DEPTH)

    # Chamfer1
    chamfer1_edges = [part_3.edges().sort_by_distance(p)[0] for p in [
        (99.587404, 99.159908733, 59.75),
    ]]
    chamfer1_side = [part_3.faces().sort_by_distance(p)[0] for p in [
        (112.793702, 99.159908733, 60),
    ]]
    chamfer(chamfer1_edges, length=CHAMFER1_SIZE, length2=CHAMFER1_SIZE2, reference=chamfer1_side[0])


solid = part_3.part
